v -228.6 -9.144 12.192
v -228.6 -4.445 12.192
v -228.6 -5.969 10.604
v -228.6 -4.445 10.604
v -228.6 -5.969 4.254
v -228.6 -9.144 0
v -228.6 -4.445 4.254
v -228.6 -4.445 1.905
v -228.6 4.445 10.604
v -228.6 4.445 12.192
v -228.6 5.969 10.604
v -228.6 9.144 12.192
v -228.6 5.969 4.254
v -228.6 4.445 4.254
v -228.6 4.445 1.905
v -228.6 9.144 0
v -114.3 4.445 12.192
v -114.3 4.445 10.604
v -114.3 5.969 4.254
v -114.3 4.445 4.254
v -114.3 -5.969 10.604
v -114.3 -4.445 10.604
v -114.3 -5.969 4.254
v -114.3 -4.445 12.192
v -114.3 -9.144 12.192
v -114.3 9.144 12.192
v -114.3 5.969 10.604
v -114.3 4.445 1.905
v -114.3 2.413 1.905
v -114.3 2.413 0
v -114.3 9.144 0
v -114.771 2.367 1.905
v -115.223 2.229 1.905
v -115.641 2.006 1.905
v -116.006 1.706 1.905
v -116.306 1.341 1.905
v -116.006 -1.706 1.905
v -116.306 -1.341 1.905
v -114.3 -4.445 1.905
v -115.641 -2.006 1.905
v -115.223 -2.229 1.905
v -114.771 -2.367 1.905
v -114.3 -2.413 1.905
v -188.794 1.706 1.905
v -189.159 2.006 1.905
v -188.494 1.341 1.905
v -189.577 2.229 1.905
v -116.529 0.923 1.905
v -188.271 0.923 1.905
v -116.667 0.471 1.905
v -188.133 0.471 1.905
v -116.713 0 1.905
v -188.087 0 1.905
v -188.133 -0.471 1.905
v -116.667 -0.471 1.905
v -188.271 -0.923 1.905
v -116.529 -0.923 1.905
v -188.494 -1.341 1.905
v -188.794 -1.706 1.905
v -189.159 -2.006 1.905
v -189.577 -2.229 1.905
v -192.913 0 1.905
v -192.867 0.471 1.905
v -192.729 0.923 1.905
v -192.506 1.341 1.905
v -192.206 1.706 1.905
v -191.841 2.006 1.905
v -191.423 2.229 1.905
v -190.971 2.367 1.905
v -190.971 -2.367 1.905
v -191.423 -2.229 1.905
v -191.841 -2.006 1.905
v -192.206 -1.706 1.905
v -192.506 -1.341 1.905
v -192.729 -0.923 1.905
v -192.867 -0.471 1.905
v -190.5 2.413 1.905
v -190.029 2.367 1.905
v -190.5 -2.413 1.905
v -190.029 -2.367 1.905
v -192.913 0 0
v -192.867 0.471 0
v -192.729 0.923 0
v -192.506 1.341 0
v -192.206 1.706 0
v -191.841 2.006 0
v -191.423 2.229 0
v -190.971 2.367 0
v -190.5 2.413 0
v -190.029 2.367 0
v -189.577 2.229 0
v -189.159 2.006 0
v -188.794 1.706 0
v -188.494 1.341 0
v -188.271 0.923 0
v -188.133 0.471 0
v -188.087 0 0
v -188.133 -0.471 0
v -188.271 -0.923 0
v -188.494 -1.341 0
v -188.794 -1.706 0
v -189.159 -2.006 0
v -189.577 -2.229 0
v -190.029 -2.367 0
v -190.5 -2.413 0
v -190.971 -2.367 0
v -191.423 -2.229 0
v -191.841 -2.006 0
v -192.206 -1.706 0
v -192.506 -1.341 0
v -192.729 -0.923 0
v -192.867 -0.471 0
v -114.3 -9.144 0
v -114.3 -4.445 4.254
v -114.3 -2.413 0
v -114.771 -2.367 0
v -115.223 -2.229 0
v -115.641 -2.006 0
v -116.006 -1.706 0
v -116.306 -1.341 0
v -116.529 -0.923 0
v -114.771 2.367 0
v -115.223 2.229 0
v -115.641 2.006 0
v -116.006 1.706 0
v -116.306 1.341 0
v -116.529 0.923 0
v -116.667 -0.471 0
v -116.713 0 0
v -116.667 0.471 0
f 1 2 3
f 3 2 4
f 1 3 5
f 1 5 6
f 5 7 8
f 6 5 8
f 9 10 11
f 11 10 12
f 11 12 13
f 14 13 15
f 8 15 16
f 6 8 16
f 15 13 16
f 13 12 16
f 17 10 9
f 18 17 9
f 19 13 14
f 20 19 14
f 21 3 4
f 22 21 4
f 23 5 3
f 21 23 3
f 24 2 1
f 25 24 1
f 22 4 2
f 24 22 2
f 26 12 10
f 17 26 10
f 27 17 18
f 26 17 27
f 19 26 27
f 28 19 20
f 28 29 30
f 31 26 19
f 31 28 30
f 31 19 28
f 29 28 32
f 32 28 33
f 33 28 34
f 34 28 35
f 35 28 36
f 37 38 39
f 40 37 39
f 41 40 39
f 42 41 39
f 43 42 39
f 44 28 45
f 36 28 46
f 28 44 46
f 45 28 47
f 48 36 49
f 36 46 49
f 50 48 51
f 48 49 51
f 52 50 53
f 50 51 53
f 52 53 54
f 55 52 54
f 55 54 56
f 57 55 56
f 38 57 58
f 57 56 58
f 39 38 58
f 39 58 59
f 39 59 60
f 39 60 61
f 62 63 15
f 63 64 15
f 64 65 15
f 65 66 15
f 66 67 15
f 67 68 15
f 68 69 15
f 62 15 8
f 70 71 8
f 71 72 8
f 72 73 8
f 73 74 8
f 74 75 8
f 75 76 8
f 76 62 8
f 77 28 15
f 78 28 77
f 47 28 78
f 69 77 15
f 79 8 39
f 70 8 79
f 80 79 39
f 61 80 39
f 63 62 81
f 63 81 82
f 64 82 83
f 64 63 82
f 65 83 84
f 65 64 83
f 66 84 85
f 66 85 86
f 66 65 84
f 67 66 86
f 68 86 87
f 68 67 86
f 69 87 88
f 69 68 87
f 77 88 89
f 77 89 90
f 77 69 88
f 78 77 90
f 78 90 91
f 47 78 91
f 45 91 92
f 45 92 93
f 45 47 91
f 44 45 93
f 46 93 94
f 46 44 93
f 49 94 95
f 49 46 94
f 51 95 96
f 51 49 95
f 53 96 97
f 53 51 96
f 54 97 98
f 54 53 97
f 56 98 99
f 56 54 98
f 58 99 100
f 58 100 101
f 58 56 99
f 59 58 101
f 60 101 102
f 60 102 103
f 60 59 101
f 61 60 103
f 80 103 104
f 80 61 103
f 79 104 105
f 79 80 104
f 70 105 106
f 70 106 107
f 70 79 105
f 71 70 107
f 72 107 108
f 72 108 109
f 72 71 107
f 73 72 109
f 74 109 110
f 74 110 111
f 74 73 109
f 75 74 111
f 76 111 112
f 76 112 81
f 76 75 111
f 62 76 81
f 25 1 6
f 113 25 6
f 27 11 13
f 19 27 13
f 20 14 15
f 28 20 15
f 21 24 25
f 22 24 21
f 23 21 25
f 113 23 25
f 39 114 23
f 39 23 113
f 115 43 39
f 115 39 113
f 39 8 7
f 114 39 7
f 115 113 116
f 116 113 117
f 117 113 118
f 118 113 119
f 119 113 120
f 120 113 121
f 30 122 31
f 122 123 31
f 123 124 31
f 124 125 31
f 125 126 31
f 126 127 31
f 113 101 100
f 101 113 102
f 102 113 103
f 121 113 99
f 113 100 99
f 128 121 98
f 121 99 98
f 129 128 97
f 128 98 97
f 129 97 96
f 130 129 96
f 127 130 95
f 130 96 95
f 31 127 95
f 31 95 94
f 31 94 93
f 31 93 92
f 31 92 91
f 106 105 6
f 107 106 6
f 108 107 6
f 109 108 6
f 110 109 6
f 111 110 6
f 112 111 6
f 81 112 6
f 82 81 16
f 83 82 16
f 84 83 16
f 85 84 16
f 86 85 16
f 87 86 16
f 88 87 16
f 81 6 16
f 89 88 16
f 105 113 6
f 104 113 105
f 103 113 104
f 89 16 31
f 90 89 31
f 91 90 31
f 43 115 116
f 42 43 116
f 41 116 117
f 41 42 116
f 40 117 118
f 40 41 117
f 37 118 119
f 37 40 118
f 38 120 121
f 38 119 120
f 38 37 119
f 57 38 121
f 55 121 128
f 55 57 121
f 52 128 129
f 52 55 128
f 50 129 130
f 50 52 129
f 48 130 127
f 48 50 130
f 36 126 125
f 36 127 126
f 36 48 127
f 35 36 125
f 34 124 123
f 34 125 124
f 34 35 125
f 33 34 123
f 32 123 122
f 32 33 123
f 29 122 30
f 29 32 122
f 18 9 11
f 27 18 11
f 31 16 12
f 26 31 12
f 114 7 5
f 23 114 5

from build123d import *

# Parameters (mm, degrees)
BOSS_EXTRUDE1_DEPTH = 228.6
SKETCH3_R           = 2.413
CUT_EXTRUDE1_DEPTH  = 1.905
LPATTERN1_COUNT     = 3
LPATTERN1_PITCH     = 76.2
SKETCH4_W           = 22.804701919
SKETCH4_H           = 24.737303777
CUT_EXTRUDE2_DEPTH  = 342.9


with BuildPart() as part:
    # Sketch2 → Boss-Extrude1 (new, symmetric)
    with BuildSketch(Plane(origin=(0, 0, 0), x_dir=(0, 0, -1), z_dir=(1, 0, 0))):
        Polygon((0, 9.144), (-12.192, 9.144), (-12.192, 4.445), (-10.6045, 4.445), (-10.6045, 5.969), (-4.2545, 5.969), (-4.2545, 4.445), (-1.905, 4.445), (-1.905, -4.445), (-4.2545, -4.445), (-4.2545, -5.969), (-10.6045, -5.969), (-10.6045, -4.445), (-12.192, -4.445), (-12.192, -9.144), (0, -9.144), align=None)
    extrude(amount=BOSS_EXTRUDE1_DEPTH, both=True)

    # Sketch3 → Cut-Extrude1 (cut)
    with BuildSketch(Plane.XY.offset(1.905)):
        with Locations((38.1, 0)):
            Circle(SKETCH3_R)
    cut_extrude1 = extrude(amount=-CUT_EXTRUDE1_DEPTH, mode=Mode.SUBTRACT)

    # LPattern1: Cut-Extrude1 ×3
    with Locations(*[(i * LPATTERN1_PITCH, 0, 0) for i in range(1, LPATTERN1_COUNT)]):
        add(cut_extrude1, mode=Mode.SUBTRACT)

    # SurfaceCut1
    split(bisect_by=Plane(origin=(0, 0, 0), x_dir=(0, 0, -1), z_dir=(1, 0, 0)), keep=Keep.TOP)

    # Mirror1: part across plane


with BuildPart() as part_1:
    add(part.part)
    add(part.part.mirror(Plane(origin=(0, 0, 0), x_dir=(0, 0, 1), z_dir=(1, 0, 0))))

    # Sketch4 → Cut-Extrude2 (cut)
    with BuildSketch(Plane(origin=(228.6, 0, 0), x_dir=(0, 0, -1), z_dir=(1, 0, 0))):
        with Locations((-5.709479629, -0.367194353)):
            Rectangle(SKETCH4_W, SKETCH4_H)
    extrude(amount=-CUT_EXTRUDE2_DEPTH, mode=Mode.SUBTRACT)


solid = part_1.part
